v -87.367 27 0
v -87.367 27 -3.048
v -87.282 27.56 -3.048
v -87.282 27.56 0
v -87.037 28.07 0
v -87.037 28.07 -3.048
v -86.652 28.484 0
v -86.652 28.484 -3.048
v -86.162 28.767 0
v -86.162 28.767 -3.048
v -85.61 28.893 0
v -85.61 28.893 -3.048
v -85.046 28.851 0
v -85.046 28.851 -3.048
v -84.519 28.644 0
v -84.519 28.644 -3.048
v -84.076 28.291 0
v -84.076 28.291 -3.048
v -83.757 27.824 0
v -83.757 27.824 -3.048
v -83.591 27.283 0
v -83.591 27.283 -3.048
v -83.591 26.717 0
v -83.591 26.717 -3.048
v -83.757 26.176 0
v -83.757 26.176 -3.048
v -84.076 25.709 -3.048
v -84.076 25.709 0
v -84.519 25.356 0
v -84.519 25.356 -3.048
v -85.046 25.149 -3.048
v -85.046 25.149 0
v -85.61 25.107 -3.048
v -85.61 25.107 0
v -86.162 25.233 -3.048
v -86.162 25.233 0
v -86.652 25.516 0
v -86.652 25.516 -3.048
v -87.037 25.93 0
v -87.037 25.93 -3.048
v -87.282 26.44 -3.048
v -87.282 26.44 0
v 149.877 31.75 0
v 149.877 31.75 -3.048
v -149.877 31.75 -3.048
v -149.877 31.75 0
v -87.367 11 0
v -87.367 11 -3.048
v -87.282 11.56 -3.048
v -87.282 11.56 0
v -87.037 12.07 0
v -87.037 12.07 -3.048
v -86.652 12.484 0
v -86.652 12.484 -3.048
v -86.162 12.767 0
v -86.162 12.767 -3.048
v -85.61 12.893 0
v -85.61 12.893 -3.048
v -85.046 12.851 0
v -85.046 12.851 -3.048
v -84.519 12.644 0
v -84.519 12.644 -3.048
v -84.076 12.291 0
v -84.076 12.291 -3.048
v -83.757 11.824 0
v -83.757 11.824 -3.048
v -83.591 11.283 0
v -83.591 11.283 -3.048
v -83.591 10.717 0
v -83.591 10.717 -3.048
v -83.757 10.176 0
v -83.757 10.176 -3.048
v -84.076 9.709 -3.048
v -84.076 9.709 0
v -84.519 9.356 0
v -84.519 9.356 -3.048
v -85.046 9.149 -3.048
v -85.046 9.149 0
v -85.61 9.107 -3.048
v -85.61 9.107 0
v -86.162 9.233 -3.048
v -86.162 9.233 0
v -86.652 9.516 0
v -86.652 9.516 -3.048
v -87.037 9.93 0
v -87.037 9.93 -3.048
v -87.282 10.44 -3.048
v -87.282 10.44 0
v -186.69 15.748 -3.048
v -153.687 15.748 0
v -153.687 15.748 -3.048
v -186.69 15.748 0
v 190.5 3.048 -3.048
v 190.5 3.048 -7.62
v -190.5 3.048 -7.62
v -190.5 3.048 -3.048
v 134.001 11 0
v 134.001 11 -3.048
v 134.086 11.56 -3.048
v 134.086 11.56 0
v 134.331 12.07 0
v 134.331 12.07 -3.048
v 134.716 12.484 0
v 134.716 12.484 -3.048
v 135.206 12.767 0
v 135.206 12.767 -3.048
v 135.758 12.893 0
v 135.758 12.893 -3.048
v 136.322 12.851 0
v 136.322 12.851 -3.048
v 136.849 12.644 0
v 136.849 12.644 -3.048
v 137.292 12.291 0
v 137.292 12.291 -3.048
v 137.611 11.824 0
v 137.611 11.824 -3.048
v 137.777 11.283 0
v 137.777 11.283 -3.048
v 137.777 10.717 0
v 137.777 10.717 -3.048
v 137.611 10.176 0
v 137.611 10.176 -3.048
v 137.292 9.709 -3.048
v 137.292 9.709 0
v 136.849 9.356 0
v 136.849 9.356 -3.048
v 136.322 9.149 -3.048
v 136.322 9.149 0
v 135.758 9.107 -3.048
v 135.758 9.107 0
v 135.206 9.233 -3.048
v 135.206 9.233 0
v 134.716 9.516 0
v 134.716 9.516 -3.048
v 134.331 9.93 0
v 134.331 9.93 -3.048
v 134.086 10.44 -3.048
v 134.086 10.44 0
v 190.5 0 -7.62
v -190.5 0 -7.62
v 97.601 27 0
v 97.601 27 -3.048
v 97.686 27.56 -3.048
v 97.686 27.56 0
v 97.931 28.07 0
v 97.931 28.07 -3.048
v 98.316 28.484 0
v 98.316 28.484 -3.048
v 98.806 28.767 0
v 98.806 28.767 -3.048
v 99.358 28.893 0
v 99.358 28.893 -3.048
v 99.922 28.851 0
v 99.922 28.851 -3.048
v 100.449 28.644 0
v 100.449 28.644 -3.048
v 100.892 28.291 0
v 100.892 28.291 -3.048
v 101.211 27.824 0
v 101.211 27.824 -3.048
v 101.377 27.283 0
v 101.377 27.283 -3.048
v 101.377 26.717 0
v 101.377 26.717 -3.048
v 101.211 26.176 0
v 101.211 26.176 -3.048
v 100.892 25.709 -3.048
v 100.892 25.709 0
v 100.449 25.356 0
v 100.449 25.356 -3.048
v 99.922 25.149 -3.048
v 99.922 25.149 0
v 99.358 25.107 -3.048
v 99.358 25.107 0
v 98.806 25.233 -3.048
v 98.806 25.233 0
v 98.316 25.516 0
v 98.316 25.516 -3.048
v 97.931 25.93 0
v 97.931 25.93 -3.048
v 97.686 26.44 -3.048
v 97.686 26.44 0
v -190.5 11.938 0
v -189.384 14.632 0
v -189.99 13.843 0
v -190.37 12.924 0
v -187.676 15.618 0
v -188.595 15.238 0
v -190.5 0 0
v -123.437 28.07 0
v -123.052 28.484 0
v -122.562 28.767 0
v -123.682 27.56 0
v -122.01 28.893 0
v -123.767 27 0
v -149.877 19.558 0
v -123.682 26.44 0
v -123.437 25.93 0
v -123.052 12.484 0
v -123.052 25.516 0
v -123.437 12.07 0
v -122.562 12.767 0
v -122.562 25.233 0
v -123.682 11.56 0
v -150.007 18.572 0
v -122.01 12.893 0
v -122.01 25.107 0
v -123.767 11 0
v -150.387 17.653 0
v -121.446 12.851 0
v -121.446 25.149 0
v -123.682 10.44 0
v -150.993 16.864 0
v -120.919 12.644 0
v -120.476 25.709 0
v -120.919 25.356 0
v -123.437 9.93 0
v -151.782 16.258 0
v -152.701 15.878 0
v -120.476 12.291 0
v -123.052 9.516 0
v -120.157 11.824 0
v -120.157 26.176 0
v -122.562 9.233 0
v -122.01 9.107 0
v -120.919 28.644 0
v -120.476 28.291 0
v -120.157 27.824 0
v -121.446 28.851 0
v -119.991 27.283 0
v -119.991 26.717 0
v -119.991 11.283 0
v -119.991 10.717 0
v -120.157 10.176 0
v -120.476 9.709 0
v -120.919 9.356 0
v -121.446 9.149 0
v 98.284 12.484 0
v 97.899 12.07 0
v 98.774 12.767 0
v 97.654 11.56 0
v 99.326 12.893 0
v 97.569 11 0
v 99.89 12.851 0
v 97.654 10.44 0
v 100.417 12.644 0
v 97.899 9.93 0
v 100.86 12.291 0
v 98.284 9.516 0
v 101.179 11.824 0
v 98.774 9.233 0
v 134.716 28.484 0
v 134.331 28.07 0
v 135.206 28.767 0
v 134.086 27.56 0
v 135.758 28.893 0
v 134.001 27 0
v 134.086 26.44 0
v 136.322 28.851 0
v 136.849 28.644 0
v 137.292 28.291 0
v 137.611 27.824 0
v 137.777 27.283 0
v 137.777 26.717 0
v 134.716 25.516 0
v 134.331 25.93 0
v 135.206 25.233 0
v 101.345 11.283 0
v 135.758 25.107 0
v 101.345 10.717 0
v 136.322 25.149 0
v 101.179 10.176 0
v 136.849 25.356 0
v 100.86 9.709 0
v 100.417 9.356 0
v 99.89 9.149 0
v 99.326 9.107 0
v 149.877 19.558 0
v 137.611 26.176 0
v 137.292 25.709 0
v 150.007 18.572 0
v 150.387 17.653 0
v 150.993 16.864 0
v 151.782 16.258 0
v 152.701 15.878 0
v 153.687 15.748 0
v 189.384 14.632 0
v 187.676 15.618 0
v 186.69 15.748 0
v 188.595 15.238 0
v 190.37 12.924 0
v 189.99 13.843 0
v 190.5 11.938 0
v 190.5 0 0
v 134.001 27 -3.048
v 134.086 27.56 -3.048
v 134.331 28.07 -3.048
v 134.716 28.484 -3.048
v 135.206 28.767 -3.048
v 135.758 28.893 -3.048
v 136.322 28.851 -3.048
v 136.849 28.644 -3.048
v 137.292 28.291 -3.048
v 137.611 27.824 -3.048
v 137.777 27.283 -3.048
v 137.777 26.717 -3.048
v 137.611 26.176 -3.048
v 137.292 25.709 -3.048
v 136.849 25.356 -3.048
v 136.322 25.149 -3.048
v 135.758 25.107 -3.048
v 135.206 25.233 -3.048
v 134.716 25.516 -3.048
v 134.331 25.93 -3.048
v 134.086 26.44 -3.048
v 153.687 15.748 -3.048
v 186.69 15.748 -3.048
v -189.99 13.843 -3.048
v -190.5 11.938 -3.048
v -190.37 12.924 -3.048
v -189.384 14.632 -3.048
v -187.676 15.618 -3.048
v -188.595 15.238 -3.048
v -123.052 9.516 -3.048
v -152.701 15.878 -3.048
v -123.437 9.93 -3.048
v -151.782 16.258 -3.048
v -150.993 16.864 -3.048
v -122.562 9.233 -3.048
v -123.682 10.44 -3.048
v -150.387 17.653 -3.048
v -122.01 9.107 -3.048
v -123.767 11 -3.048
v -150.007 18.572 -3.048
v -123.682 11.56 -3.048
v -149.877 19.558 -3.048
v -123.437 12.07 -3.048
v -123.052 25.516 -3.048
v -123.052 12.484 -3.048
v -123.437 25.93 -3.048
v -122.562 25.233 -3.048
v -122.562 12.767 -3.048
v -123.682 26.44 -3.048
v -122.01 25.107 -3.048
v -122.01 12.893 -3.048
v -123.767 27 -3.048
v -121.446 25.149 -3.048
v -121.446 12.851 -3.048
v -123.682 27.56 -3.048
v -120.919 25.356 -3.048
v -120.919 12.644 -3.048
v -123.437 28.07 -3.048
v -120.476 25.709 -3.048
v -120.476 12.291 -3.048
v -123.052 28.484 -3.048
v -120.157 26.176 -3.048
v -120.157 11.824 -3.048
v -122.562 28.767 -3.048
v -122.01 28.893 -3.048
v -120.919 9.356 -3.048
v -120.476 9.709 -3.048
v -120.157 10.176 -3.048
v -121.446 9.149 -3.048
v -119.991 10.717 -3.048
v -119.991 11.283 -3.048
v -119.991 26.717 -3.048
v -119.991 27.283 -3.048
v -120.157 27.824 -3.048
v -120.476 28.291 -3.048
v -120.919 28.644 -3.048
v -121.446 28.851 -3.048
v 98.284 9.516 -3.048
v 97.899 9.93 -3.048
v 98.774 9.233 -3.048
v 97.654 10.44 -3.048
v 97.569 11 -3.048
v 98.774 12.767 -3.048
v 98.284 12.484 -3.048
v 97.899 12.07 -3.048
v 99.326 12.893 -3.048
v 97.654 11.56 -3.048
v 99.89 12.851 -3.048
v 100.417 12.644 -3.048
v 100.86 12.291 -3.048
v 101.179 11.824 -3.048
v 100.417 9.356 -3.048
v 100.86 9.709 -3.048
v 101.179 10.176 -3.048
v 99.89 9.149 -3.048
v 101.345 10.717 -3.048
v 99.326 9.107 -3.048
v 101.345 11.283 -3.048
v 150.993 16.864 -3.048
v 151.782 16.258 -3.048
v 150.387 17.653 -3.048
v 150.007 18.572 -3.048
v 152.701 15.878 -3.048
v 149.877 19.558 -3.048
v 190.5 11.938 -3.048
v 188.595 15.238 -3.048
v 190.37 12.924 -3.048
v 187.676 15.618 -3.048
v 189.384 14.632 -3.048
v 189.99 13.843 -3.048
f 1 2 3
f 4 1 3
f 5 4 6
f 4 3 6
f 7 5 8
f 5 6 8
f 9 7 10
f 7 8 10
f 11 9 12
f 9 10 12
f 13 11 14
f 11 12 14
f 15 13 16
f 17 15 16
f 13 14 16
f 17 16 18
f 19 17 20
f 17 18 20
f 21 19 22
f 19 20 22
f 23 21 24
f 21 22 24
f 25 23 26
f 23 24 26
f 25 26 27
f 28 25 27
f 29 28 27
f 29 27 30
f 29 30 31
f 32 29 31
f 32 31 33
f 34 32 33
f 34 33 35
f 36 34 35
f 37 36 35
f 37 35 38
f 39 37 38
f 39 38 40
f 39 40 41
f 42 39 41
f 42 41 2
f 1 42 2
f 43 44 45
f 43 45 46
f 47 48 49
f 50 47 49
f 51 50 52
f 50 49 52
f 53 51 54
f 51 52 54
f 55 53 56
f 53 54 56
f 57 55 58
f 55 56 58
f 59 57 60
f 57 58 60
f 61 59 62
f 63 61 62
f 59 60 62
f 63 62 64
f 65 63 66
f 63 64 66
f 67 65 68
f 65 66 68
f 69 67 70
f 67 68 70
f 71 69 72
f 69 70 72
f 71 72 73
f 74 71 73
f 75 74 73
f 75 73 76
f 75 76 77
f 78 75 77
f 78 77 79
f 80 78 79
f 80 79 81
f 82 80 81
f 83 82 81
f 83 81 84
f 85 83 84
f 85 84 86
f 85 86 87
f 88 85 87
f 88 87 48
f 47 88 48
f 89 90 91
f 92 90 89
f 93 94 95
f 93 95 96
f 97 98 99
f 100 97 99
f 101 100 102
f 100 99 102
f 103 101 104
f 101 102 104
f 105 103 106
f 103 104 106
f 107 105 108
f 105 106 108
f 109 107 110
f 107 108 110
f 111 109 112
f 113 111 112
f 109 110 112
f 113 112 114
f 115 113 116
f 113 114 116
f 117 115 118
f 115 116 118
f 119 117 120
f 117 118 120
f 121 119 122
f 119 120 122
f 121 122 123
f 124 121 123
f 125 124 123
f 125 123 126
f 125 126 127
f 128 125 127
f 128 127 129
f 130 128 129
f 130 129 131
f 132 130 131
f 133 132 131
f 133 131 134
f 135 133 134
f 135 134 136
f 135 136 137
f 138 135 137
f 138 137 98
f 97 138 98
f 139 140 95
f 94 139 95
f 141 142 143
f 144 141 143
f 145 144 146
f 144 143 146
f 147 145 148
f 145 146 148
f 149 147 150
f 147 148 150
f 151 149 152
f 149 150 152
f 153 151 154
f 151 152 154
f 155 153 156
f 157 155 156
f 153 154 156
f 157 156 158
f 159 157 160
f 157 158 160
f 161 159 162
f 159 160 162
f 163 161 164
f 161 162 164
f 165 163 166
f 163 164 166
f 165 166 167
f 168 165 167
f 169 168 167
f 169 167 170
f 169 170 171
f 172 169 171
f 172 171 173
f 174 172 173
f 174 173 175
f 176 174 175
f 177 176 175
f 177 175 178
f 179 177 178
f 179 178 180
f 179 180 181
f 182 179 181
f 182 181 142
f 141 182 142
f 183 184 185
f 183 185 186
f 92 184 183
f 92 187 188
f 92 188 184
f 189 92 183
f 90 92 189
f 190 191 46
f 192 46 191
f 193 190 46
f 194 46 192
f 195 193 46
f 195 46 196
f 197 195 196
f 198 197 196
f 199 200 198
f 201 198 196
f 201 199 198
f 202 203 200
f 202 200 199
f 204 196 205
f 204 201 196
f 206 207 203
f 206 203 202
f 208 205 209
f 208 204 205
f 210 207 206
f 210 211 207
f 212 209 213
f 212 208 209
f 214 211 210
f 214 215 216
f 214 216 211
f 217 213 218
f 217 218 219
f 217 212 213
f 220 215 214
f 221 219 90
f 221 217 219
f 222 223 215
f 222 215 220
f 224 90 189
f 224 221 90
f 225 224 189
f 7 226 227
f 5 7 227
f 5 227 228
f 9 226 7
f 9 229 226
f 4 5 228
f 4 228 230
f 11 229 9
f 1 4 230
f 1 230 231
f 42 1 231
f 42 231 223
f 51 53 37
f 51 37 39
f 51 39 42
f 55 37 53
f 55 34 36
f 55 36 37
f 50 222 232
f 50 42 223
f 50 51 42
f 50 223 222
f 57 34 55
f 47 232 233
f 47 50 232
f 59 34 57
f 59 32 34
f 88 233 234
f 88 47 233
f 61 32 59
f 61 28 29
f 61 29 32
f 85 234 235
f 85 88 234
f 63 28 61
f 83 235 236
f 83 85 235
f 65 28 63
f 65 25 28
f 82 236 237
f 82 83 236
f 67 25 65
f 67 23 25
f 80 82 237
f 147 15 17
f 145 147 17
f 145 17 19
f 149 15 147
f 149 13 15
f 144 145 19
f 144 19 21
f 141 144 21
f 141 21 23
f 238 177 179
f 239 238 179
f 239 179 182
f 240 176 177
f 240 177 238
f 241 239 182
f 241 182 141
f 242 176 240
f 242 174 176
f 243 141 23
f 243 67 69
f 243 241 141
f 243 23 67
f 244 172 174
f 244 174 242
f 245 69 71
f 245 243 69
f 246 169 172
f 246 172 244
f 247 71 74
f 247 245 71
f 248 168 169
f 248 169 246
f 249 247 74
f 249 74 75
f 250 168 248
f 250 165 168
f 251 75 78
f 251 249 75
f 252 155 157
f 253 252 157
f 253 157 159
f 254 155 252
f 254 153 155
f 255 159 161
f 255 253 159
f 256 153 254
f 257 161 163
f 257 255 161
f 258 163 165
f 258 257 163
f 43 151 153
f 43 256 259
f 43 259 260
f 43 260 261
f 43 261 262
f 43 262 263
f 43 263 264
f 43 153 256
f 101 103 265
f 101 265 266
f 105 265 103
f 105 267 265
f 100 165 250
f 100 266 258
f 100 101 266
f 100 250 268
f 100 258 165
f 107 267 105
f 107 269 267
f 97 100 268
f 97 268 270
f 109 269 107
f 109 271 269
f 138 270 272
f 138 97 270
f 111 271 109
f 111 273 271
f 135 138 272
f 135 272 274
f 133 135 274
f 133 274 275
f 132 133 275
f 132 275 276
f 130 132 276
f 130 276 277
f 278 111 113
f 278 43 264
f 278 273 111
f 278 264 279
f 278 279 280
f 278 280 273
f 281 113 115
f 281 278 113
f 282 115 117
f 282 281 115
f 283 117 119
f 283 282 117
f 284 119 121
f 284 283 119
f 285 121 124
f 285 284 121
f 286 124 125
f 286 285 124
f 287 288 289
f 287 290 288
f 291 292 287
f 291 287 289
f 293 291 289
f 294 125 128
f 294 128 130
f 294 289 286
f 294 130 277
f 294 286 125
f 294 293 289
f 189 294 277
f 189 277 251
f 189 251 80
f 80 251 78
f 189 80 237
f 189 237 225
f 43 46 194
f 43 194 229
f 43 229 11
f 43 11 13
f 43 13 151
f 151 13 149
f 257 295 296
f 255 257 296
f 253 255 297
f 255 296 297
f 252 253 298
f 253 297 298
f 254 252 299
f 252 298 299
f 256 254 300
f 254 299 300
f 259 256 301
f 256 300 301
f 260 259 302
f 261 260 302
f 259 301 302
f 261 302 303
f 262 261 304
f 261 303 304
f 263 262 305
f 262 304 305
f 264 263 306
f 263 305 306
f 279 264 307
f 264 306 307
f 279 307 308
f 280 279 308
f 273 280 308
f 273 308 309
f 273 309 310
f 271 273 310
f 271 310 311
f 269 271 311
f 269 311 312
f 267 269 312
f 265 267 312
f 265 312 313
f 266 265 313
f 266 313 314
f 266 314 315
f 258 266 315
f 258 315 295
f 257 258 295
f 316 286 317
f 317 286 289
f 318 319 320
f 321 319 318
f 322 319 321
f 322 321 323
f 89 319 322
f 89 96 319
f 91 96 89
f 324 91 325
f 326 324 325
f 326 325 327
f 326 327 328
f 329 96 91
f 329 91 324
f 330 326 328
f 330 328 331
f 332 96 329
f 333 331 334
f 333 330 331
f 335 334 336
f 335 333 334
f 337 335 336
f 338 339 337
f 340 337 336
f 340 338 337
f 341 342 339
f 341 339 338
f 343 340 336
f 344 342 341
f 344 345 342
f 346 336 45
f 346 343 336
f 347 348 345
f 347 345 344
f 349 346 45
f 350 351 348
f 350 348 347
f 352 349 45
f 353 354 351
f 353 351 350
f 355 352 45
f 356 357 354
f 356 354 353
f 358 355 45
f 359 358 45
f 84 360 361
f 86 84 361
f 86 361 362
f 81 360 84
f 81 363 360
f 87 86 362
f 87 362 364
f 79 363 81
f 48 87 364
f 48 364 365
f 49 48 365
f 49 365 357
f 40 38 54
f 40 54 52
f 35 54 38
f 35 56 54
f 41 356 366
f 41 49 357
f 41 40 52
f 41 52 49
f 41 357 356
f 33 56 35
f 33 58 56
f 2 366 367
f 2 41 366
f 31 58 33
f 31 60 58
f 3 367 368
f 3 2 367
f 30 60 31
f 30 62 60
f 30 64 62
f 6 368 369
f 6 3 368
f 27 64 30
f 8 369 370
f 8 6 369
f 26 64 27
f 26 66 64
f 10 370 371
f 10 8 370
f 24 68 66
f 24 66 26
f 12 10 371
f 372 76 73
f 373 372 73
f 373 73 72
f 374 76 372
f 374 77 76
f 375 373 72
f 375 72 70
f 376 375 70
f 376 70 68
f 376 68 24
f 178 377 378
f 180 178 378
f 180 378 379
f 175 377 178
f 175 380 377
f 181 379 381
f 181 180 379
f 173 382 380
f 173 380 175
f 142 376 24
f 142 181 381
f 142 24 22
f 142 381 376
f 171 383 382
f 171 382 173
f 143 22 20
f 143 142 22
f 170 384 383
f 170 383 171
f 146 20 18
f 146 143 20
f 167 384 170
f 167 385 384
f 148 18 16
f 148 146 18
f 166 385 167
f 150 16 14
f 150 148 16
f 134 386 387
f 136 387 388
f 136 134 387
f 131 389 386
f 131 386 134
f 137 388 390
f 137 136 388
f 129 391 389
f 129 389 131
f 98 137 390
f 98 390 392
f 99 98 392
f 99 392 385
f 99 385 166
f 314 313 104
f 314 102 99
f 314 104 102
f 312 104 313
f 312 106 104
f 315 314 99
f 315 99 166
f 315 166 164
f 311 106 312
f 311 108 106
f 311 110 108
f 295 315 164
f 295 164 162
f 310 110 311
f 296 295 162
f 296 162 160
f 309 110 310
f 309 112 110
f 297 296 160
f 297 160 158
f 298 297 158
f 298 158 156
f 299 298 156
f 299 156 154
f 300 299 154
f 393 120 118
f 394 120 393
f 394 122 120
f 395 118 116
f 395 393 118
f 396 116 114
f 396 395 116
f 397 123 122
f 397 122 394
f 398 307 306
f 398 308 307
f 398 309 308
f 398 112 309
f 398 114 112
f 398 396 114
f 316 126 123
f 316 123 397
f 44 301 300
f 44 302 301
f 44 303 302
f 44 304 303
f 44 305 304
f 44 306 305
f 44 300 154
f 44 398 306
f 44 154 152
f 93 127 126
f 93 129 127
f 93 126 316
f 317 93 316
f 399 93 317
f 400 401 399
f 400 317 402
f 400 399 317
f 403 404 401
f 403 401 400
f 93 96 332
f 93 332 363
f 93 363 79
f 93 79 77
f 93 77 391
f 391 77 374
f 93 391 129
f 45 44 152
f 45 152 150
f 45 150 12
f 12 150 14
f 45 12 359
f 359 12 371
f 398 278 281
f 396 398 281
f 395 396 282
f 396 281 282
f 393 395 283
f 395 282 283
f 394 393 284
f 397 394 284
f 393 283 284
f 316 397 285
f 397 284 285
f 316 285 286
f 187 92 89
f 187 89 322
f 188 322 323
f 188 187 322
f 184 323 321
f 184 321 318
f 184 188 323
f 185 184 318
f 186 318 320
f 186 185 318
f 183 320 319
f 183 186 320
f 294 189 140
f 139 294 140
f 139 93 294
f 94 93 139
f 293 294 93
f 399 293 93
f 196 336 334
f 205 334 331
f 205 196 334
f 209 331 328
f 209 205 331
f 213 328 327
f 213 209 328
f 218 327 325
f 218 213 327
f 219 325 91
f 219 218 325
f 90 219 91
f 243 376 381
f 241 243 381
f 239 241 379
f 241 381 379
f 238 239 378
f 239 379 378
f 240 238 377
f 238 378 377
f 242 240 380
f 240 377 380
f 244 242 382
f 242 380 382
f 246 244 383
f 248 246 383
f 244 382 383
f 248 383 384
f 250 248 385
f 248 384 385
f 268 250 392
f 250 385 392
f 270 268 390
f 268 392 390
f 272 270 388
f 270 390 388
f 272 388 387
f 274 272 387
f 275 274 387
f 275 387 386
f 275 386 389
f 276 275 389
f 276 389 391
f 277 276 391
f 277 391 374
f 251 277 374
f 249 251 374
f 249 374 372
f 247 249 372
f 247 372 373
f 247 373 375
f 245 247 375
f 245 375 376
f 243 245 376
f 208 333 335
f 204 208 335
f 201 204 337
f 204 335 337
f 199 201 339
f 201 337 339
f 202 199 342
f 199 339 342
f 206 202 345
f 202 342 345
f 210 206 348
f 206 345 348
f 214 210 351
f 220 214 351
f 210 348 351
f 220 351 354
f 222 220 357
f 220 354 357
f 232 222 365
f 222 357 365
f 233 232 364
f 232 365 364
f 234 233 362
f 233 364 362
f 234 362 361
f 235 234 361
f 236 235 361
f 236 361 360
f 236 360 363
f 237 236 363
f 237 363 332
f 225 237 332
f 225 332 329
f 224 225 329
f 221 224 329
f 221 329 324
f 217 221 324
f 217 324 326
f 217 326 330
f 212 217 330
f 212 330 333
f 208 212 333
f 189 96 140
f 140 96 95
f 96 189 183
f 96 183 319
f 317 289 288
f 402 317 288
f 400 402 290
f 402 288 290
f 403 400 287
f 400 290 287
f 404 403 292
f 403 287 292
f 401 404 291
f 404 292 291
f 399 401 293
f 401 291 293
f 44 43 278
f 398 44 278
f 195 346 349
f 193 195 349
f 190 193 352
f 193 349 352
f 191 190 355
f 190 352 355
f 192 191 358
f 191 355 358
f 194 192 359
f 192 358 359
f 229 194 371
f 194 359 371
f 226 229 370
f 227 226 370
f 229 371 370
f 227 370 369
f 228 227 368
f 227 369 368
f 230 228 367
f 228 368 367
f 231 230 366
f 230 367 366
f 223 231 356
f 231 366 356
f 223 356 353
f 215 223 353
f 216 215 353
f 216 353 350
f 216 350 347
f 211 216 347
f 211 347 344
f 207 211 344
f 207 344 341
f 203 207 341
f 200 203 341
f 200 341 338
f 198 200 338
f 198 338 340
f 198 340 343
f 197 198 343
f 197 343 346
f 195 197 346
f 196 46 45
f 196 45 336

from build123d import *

# Parameters (mm, degrees)
BOSS_EXTRUDE1_DEPTH     = 190.5
F_6_CLEARANCE_HOLE1_D   = 3.7973
CUT_EXTRUDE1_DEPTH      = 32.75
SKETCH6_W               = 25.4
SKETCH6_H               = 15.24
CUT_EXTRUDE2_DEPTH      = 191.5
CUT_EXTRUDE2_DEPTH_BACK = 191.5


with BuildPart() as part:
    # Sketch1 → Boss-Extrude1 (new body, symmetric)
    with BuildSketch(Plane(origin=(0, 0, 0), x_dir=(0, 0, -1), z_dir=(1, 0, 0))):
        Polygon((0, 0), (31.75, 0), (31.75, 3.048), (3.048, 3.048), (3.048, 31.75), (0, 31.75), align=None)
    extrude(amount=BOSS_EXTRUDE1_DEPTH, both=True)

    # #6 Clearance Hole1 (through all)
    with Locations(Plane.XY):
        with Locations((135.9, 27), (135.9, 11), (99.5, 27), (99.468, 11), (-121.868, 27), (-121.868, 11), (-85.468, 11), (-85.468, 27)):
            Hole(F_6_CLEARANCE_HOLE1_D / 2)

    # Sketch5 → Cut-Extrude1 (cut, through all)
    with BuildSketch(Plane.XY):
        with BuildLine():
            Line((149.877, 41.148), (149.877, 19.558))
            ThreePointArc((149.877, 19.558), (150.992923164, 16.863923164), (153.687, 15.748))
            Line((153.687, 15.748), (186.69, 15.748))
            ThreePointArc((186.69, 15.748), (189.384076836, 14.632076836), (190.5, 11.938))
            Line((190.5, 11.938), (190.5, -9.652))
            Line((190.5, -9.652), (198.12, -9.652))
            Line((198.12, -9.652), (198.12, 41.148))
            Line((198.12, 41.148), (149.877, 41.148))
        make_face()
        with BuildLine():
            Line((-198.12, 41.148), (-149.877, 41.148))
            Line((-149.877, 41.148), (-149.877, 19.558))
            ThreePointArc((-149.877, 19.558), (-150.992923164, 16.863923164), (-153.687, 15.748))
            Line((-153.687, 15.748), (-186.69, 15.748))
            ThreePointArc((-186.69, 15.748), (-189.384076836, 14.632076836), (-190.5, 11.938))
            Line((-190.5, 11.938), (-190.5, -9.652))
            Line((-190.5, -9.652), (-198.12, -9.652))
            Line((-198.12, -9.652), (-198.12, 41.148))
        make_face()
    extrude(amount=-CUT_EXTRUDE1_DEPTH, mode=Mode.SUBTRACT)

    # Sketch6 → Cut-Extrude2 (cut, two sides)
    with BuildSketch(Plane(origin=(0, 0, 0), x_dir=(0, 0, -1), z_dir=(1, 0, 0))) as cut_extrude2_sk:
        with Locations((20.32, 0)):
            Rectangle(SKETCH6_W, SKETCH6_H)
    extrude(amount=CUT_EXTRUDE2_DEPTH, mode=Mode.SUBTRACT)
    extrude(cut_extrude2_sk.sketch, amount=-CUT_EXTRUDE2_DEPTH_BACK, mode=Mode.SUBTRACT)


solid = part.part
